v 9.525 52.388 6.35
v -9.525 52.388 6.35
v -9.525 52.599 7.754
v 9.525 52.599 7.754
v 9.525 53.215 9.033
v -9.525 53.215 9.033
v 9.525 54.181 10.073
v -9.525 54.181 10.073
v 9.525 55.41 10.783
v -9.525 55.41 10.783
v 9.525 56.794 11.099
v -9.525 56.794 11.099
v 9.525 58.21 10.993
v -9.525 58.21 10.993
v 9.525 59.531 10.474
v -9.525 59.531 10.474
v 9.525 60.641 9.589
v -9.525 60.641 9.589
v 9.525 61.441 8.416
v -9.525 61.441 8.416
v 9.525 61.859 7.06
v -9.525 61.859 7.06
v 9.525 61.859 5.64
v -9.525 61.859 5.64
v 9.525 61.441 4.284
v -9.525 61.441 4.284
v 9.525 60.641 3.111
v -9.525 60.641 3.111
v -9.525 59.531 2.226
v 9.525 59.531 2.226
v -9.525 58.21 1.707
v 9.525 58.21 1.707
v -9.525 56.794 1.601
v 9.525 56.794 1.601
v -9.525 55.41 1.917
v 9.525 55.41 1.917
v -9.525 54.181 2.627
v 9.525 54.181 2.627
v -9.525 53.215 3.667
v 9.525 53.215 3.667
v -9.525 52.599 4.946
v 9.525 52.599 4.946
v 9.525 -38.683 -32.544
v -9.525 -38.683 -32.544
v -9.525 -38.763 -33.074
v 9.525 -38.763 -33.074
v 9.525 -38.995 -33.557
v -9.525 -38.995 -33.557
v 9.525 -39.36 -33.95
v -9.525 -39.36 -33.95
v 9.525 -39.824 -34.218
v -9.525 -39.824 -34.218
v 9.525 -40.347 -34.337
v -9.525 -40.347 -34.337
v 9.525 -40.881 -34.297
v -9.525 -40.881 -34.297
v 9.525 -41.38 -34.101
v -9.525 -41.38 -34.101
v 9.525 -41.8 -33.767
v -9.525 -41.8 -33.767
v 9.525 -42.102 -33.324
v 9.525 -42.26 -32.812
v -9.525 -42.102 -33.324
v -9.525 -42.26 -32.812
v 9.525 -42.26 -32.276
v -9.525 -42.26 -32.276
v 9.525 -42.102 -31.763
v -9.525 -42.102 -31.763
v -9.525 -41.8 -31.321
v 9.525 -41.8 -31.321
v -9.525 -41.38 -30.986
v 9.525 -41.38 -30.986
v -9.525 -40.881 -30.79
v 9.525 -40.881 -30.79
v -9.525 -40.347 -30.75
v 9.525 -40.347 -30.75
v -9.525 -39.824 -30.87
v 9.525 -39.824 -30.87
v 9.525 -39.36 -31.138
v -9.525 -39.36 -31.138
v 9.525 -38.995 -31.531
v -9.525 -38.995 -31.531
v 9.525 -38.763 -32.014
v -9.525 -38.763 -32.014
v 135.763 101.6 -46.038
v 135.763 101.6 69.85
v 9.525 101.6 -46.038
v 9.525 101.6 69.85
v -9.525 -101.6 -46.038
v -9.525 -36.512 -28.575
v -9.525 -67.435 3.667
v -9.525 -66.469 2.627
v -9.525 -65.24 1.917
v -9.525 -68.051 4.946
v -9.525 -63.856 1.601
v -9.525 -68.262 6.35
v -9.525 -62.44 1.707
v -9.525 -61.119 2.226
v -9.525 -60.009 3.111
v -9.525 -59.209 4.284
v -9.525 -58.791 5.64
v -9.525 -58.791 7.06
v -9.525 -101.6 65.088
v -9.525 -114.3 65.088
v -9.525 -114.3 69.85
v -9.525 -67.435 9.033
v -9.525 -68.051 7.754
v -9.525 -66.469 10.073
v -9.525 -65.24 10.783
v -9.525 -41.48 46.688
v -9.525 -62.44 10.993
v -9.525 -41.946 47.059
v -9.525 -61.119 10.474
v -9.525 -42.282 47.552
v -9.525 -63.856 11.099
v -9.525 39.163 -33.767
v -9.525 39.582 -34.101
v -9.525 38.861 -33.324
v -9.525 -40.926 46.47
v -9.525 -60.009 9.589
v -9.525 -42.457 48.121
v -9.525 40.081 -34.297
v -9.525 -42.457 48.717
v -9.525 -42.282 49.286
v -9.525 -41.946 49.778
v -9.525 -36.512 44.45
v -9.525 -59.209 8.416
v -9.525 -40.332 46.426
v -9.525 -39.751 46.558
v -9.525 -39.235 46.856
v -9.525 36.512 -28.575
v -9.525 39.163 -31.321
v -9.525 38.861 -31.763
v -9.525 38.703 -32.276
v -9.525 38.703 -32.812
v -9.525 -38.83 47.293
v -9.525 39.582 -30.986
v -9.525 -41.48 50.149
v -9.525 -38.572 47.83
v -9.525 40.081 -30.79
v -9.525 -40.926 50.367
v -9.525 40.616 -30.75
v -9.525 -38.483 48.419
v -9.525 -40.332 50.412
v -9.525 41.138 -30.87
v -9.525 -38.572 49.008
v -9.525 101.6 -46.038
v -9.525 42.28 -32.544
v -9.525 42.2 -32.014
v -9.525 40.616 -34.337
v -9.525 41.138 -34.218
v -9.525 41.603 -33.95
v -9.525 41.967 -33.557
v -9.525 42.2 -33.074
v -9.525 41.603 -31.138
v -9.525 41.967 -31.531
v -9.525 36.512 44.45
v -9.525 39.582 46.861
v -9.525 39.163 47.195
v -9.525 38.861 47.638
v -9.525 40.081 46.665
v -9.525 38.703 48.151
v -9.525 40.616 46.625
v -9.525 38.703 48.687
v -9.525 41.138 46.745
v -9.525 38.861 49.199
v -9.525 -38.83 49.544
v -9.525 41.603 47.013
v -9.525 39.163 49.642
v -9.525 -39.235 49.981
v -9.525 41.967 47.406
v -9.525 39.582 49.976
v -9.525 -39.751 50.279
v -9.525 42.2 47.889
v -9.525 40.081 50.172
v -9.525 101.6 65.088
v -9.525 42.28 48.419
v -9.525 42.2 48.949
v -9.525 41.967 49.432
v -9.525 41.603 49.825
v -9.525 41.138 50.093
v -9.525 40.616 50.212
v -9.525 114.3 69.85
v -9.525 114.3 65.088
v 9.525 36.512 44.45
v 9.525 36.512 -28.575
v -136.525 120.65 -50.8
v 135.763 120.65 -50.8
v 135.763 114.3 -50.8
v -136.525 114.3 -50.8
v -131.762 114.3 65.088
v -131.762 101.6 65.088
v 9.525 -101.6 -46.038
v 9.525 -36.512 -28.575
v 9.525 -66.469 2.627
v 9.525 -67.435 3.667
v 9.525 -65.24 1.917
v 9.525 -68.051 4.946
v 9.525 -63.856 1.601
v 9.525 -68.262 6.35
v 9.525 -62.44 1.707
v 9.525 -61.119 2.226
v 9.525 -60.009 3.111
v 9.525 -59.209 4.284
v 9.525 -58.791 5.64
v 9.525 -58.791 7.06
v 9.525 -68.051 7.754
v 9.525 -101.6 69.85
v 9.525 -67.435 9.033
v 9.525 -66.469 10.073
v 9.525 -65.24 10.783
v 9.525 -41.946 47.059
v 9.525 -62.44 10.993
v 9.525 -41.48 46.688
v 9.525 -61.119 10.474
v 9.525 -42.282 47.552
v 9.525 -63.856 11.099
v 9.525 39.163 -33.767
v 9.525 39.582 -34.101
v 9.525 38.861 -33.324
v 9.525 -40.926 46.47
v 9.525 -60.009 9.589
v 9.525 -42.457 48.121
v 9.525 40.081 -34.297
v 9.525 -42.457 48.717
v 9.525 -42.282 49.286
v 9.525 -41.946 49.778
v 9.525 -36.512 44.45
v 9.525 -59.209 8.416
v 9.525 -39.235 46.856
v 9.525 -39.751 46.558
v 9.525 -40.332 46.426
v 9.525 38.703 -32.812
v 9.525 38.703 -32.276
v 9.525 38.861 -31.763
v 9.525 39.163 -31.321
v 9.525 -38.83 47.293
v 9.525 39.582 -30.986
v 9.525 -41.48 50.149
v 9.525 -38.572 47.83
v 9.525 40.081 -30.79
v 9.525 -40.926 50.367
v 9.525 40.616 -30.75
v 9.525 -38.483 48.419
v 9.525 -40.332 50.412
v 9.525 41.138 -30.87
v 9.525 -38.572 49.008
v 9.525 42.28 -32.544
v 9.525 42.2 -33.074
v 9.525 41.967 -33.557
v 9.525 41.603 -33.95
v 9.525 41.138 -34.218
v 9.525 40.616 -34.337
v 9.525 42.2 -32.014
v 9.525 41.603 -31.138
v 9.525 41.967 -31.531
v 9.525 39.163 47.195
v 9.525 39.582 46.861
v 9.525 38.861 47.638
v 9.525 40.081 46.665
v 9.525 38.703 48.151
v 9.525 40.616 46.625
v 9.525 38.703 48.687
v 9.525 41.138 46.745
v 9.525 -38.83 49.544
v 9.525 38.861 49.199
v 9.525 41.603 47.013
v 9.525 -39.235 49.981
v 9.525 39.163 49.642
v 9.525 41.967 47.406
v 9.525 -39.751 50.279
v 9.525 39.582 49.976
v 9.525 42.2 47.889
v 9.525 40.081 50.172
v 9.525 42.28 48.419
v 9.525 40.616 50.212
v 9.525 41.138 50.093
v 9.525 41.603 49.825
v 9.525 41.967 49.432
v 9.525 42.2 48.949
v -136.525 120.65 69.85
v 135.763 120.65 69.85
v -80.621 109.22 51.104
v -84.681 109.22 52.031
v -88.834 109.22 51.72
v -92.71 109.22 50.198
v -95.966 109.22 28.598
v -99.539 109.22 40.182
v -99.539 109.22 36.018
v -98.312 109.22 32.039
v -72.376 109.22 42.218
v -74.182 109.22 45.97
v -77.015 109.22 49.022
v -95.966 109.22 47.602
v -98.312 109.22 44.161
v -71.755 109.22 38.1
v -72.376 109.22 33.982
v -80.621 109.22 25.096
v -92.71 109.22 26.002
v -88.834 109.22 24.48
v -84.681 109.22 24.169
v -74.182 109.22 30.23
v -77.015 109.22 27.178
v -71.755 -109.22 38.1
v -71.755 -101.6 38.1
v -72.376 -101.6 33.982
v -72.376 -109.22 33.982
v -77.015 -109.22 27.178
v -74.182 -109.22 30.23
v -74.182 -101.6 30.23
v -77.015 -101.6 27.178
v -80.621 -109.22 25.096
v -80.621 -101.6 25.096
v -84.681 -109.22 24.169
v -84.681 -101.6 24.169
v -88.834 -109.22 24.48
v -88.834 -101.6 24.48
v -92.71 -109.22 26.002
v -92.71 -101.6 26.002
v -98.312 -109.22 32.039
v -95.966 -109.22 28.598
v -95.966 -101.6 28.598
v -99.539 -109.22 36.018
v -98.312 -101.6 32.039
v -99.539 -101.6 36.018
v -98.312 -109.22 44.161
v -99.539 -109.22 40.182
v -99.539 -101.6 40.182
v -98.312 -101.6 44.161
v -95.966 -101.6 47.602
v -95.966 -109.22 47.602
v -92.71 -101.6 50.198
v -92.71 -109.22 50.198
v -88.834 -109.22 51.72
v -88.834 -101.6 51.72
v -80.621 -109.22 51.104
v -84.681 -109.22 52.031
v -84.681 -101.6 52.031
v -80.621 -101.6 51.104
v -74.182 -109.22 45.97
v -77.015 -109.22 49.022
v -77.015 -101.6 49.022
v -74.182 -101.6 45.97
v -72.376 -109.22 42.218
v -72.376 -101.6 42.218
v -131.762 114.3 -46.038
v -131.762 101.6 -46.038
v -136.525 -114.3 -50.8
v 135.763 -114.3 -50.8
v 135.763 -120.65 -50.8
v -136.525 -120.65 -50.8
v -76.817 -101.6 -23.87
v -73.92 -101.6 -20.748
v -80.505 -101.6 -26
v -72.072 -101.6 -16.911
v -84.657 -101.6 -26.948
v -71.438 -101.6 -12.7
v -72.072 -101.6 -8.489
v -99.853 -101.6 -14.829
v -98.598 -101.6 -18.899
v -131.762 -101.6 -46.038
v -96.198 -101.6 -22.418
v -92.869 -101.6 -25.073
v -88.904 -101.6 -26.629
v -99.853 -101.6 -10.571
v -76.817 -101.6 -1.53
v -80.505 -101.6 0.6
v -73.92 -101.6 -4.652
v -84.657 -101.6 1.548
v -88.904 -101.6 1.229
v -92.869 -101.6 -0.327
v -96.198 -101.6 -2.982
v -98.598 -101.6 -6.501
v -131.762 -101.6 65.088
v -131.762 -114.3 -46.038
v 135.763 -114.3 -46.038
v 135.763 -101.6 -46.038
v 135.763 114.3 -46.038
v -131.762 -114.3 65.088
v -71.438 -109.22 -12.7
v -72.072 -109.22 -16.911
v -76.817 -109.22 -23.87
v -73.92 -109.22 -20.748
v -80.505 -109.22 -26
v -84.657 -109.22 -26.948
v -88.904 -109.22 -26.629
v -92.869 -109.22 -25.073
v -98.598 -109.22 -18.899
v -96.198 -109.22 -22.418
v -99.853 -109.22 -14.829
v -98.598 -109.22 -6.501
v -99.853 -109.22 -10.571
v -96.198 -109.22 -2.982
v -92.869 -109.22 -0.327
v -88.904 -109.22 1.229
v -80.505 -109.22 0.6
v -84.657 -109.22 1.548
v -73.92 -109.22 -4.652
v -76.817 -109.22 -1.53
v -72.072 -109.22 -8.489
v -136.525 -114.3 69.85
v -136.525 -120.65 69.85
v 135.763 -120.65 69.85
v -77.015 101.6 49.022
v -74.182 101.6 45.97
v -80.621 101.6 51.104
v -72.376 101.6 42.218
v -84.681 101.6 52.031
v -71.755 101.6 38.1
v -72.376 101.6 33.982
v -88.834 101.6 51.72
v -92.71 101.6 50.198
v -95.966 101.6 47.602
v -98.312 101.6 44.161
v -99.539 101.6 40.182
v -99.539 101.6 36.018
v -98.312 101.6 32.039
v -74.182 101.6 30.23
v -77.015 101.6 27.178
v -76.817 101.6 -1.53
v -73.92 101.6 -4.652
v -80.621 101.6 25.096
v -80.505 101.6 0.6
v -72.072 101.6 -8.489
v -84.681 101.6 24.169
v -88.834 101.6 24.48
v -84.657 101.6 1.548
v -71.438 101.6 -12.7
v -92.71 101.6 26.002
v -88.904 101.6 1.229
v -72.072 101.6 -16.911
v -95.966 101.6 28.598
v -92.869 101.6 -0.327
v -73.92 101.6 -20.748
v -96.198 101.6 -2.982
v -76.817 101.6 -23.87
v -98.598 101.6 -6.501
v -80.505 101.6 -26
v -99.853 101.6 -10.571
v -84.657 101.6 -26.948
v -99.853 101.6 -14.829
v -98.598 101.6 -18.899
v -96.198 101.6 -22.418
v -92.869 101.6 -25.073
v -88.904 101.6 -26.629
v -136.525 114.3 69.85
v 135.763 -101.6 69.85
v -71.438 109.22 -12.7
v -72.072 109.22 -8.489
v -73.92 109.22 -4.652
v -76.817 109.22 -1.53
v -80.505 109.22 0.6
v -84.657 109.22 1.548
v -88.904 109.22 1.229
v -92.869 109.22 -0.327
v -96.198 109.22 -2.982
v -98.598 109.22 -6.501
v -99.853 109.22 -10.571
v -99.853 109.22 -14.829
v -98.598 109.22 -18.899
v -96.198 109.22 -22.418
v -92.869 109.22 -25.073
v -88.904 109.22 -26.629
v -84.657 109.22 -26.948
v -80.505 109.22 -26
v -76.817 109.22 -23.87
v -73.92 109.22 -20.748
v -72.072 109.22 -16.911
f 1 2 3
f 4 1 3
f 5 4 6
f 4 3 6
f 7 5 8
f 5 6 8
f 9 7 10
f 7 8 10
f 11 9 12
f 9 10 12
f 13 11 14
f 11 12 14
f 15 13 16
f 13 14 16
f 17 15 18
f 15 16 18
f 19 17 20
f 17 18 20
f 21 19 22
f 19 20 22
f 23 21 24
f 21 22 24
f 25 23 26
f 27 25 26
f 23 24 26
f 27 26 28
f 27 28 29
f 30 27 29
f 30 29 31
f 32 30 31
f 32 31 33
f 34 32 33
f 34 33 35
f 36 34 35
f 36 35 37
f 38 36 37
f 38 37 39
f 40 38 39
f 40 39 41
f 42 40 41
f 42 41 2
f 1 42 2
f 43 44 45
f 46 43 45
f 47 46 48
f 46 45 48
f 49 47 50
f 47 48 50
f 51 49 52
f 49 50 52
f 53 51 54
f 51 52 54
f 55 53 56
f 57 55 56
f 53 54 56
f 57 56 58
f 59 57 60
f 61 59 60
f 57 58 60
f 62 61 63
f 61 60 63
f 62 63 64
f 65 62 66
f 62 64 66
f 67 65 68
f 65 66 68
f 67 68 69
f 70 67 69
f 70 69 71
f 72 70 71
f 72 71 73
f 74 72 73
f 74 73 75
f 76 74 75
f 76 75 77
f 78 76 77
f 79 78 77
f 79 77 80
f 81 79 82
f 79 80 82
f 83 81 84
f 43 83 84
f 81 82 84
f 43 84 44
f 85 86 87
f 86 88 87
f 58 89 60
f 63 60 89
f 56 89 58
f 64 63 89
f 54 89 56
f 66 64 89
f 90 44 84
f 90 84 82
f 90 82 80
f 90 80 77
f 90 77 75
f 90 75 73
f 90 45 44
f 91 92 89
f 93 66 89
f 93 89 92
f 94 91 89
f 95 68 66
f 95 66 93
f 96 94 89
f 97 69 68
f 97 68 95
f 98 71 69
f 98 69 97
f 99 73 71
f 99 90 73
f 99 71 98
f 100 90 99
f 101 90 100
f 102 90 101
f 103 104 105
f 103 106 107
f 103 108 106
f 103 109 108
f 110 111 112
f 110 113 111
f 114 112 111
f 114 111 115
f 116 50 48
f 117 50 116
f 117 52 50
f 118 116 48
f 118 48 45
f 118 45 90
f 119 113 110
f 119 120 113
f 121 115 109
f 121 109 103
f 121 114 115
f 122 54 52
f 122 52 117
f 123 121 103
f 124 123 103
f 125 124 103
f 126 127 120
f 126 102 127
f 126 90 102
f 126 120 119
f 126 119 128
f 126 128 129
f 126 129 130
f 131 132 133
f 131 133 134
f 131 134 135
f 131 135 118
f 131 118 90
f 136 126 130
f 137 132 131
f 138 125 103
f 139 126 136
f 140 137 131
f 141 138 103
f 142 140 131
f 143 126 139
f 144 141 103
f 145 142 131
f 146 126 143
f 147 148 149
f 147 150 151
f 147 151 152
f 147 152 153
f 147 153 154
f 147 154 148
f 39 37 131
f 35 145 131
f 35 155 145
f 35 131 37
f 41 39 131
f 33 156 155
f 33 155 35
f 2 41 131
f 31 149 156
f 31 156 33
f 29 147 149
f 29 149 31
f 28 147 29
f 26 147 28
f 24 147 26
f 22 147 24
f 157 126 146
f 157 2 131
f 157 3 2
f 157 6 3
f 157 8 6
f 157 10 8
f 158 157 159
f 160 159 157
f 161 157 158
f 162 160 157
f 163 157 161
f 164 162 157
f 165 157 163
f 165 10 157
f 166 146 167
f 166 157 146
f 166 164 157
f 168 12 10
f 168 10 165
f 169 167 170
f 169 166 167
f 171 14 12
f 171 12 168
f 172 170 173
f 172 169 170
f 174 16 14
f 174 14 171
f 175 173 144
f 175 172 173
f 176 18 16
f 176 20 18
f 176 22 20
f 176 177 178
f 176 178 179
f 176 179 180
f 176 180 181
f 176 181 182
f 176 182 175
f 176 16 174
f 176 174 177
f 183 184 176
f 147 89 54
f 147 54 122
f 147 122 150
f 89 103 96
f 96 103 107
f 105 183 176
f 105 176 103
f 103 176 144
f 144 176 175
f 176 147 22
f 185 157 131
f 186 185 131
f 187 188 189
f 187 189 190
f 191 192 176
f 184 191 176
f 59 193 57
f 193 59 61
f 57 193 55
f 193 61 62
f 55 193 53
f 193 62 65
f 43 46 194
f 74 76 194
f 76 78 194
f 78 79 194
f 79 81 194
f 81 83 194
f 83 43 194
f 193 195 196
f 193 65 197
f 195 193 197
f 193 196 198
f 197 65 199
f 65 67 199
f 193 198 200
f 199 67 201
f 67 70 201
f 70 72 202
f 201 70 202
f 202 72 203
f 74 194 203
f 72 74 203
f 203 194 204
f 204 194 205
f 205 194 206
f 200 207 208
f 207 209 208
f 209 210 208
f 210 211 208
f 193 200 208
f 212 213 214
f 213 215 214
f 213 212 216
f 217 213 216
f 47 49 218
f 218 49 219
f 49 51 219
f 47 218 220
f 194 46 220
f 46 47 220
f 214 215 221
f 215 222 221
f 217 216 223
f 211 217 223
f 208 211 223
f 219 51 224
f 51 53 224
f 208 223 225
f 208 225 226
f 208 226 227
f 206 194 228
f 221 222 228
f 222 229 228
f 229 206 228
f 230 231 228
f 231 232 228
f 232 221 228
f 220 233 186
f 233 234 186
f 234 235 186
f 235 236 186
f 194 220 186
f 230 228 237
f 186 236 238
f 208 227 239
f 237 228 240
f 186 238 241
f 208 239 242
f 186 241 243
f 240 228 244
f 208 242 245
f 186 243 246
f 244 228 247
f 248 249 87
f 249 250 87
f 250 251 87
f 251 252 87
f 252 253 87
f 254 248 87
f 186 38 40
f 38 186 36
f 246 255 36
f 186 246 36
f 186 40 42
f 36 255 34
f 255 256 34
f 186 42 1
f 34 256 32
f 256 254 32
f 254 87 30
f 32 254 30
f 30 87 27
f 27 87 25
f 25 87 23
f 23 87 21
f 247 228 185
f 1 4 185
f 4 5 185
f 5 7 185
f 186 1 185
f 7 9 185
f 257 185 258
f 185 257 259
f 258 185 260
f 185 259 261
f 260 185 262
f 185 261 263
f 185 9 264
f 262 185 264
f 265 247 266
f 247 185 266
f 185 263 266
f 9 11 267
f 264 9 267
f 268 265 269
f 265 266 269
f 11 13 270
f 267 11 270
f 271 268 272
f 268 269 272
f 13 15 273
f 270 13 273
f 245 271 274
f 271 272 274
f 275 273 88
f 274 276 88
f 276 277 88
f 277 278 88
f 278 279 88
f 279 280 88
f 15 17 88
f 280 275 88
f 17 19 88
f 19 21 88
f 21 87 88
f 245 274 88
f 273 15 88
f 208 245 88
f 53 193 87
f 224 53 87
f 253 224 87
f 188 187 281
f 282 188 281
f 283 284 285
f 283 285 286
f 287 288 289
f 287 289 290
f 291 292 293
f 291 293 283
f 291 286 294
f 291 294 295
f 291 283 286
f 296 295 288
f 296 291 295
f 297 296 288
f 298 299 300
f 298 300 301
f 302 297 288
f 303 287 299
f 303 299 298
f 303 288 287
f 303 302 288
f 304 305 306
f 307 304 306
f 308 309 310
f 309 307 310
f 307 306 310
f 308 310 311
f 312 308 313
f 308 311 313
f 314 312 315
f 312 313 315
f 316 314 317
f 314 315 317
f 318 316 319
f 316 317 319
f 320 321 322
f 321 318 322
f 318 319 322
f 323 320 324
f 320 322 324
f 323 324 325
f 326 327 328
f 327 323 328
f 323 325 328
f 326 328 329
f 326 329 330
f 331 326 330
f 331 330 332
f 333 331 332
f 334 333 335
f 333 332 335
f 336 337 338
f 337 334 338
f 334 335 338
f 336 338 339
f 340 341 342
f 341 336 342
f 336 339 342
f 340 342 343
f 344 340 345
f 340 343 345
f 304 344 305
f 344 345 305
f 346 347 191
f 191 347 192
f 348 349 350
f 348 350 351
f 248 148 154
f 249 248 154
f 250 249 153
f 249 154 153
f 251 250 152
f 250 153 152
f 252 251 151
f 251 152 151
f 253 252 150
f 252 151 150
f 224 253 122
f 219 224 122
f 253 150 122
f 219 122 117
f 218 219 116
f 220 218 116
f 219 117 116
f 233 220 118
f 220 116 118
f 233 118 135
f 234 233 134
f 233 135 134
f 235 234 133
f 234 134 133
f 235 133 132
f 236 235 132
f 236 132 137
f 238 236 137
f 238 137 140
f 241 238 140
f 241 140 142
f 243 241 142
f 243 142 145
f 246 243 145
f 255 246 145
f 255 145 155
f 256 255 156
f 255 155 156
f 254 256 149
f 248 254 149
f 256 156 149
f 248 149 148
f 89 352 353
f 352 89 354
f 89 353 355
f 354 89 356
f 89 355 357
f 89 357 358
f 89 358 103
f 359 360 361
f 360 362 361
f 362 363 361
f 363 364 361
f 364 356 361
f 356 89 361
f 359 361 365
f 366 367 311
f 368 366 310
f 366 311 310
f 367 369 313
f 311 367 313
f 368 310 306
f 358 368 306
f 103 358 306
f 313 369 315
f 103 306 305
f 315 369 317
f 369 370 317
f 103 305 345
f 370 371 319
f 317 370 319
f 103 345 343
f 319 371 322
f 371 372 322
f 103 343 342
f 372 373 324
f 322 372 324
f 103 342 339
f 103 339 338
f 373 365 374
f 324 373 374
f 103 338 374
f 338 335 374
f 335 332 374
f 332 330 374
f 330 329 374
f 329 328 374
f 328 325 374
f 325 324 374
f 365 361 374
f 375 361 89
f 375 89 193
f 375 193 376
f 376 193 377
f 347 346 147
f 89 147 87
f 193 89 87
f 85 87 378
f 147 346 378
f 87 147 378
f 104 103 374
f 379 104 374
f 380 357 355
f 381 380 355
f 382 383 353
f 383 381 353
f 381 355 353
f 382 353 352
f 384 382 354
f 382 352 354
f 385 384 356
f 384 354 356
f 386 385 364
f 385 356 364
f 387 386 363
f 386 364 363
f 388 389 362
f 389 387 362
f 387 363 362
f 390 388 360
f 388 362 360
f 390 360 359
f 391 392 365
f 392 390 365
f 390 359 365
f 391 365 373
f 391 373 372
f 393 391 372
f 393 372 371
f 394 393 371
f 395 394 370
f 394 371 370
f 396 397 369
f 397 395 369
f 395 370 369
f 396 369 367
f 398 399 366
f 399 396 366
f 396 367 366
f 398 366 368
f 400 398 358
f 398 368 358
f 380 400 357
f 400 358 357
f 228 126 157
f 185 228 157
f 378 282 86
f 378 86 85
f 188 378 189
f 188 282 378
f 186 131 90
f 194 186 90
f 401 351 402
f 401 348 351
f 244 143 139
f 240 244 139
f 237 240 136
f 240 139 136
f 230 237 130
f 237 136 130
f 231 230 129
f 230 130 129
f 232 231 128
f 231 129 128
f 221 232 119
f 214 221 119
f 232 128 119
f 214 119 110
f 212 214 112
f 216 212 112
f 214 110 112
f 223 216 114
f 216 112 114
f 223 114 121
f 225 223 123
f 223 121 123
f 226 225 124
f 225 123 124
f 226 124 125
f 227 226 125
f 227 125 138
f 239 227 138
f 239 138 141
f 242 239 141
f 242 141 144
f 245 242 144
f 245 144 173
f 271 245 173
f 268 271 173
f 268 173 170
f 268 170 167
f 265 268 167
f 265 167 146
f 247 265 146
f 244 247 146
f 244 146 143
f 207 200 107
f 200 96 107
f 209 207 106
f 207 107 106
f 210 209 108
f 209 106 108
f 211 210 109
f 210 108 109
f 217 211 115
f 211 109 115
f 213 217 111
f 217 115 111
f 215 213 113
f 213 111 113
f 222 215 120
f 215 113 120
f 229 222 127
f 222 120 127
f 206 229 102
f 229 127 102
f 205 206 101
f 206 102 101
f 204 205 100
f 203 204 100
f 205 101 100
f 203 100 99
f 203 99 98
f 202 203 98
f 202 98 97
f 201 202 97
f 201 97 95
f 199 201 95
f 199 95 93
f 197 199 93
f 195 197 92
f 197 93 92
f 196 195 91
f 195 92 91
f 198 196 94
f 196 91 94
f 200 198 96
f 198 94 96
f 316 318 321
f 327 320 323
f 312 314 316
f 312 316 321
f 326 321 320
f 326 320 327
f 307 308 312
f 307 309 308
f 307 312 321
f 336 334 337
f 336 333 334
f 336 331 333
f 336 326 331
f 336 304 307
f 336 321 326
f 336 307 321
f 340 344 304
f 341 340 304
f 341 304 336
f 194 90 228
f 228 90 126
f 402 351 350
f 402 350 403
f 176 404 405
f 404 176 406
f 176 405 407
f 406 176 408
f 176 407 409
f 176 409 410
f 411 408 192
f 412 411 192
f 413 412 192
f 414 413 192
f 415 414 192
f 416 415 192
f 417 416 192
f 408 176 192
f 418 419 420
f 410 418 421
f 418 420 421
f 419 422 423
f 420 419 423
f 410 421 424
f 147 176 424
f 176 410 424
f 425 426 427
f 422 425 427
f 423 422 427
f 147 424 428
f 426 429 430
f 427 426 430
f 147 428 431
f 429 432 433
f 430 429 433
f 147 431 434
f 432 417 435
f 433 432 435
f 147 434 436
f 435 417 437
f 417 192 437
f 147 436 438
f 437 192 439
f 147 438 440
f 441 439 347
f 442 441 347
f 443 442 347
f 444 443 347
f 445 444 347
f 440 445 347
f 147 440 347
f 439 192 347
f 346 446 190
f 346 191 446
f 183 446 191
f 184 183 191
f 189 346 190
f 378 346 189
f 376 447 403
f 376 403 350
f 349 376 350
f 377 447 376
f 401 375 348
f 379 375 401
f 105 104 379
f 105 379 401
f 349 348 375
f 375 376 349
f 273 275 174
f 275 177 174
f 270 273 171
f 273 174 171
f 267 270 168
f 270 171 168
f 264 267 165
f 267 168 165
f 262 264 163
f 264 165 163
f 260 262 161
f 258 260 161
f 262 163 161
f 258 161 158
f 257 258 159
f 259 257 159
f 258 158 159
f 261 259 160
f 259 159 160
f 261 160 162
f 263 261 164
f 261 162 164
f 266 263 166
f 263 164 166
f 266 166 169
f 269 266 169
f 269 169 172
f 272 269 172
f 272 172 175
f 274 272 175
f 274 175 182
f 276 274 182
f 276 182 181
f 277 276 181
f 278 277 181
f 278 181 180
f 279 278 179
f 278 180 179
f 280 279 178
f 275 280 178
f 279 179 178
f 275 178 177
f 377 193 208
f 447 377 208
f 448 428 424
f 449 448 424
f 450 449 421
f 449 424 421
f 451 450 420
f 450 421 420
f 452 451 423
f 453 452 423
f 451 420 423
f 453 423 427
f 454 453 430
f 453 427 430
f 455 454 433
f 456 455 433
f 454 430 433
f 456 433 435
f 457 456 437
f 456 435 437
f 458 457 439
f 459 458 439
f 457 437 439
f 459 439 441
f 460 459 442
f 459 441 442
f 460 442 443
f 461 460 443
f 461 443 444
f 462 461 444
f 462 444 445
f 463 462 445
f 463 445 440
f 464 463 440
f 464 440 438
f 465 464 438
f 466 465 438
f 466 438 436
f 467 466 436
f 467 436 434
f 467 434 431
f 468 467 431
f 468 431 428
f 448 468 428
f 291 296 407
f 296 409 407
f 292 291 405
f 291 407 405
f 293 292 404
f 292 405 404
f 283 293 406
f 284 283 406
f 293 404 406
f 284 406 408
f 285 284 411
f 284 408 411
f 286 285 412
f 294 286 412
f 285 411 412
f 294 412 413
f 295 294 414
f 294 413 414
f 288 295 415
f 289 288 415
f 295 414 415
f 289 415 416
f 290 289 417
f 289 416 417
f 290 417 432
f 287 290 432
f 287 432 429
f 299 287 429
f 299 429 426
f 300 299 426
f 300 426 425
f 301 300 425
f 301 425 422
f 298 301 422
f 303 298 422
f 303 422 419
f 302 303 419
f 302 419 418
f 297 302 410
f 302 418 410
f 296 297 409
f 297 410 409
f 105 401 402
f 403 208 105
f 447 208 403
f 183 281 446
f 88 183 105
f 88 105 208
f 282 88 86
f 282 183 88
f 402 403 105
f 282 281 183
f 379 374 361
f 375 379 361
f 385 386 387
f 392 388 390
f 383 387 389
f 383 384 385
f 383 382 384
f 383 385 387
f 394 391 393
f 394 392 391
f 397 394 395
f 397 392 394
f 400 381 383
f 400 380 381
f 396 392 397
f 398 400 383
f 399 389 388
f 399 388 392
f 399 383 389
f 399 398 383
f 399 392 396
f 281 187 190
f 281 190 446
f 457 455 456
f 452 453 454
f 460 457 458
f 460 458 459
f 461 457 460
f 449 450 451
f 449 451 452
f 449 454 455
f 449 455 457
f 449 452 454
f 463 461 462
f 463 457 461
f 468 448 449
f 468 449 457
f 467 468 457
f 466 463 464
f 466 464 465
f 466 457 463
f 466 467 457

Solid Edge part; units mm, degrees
sketch "Sketch1" plane through (0, 0, 0) normal (0, -1, 0) x (1, 0, 0)
  line L0 (-136.525, 69.85) -> (135.763, 69.85)
  line L1 (135.763, 69.85) -> (135.763, -50.8)
  line L2 (135.763, -50.8) -> (-136.525, -50.8)
  line L3 (-136.525, -50.8) -> (-136.525, 69.85)
  dimension "D1" = 50.8
  dimension "D2" = 120.65
  dimension "D3" = 120.65
extrude "Protrusion1" add sketch "Sketch1" along normal mid plane 241.3
sketch "Sketch2" plane through (0, 0, 0) normal (1, 0, 0) x (0, 1, 0)
  line L0 (101.6, -69.85) -> (-101.6, -69.85)
  line L1 (-101.6, -69.85) -> (-101.6, 69.85)
  line L2 (-101.6, 69.85) -> (101.6, 69.85)
  line L3 (101.6, 69.85) -> (101.6, -69.85)
  dimension "D1" = 19.05
  dimension "D2" = 19.05
extrude "Cutout1" cut sketch "Sketch2" along normal up to next and the other way up to next
sketch "Sketch3" plane through (6.4194, -101.6, 0) normal (0, 1, 0) x (-1, 0, 0)
  line L0 (138.1819, -46.0375) -> (15.9444, -46.0375)
  line L1 (15.9444, -50.8) -> (15.9444, -46.0375)
  line L2 (15.9444, -50.8) -> (142.9444, -50.8)
  line L3 (142.9444, -50.8) -> (142.9444, 69.85)
  line L4 (142.9444, 69.85) -> (15.9444, 69.85)
  line L5 (15.9444, 65.0875) -> (15.9444, 69.85)
  line L6 (15.9444, 65.0875) -> (138.1819, 65.0875)
  line L7 (138.1819, 65.0875) -> (138.1819, -46.0375)
  dimension "D1" = 4.7625
  dimension "D2" = 4.7625
  dimension "D3" = 4.7625
extrude "ExtrudedCutout_2" cut sketch "Sketch3" against normal blind 12.7
mirror "Mirror1" about plane through (0, 0, 0) normal (0, 1, 0) of "ExtrudedCutout_2"
sketch "Sketch4" plane through (21.4313, 101.6, 12.7) normal (0, -1, 0) x (1, 0, 0)
  circle A0 centre (-107.1563, -25.4) radius 14.2875
  circle A1 centre (-107.1563, 25.4) radius 13.97
  dimension "D1" = 28.575
extrude "ExtrudedCutout_3" cut sketch "Sketch4" against normal blind 7.62
mirror "Mirror2" about plane through (0, 0, 0) normal (0, -1, 0) of "ExtrudedCutout_3"
sketch "Sketch5" plane through (6.4194, 0, 0) normal (0, -1, 0) x (1, 0, 0)
  line L0 (-15.9444, -46.0375) -> (3.1056, -46.0375)
  line L1 (3.1056, -46.0375) -> (3.1056, 69.85)
  line L2 (3.1056, 69.85) -> (-15.9444, 69.85)
  line L3 (-15.9444, 69.85) -> (-15.9444, -46.0375)
  dimension "D1" = 19.05
  dimension "D2" = 4.7625
extrude "Protrusion2" add sketch "Sketch5" along normal up to next and the other way up to next
sketch "Sketch6" plane through (0, 0, 0) normal (1, 0, 0) x (0, 1, 0)
  line L0 (36.5125, -28.575) -> (-36.5125, -28.575)
  line L1 (-36.5125, -28.575) -> (-36.5125, 44.45)
  line L2 (-36.5125, 44.45) -> (36.5125, 44.45)
  line L3 (36.5125, 44.45) -> (36.5125, -28.575)
  circle A0 centre (-40.4813, 48.4187) radius 1.9984
  circle A1 centre (-40.4812, -32.5438) radius 1.7985
  circle A2 centre (40.4813, 48.4187) radius 1.7985
  circle A3 centre (40.4813, -32.5438) radius 1.7985
  dimension "D1" = 73.025
  dimension "D2" = 73.025
  dimension "D3" = 22.225
  dimension "D4" = 80.9625
  dimension "D5" = 80.9625
  dimension "D6" = 92.075
  dimension "D7" = 92.075
extrude "Cutout2" cut sketch "Sketch6" along normal up to next and the other way up to next
sketch "Sketch7" plane through (-9.525, 0, 3.175) normal (-1, 0, 0) x (0, -1, 0)
  circle A0 centre (-57.15, 3.175) radius 4.7625
  circle A1 centre (63.5, 3.175) radius 4.7625
  dimension "D1" = 6.35
  dimension "D2" = 57.15
  dimension "D3" = 63.5
  dimension "D4" = 9.525
extrude "Cutout3" cut sketch "Sketch7" against normal up to next
sketch "Sketch8" plane through (-136.525, 117.475, 0) normal (-1, 0, 0) x (0, 0, 1)
  line L0 (-46.0375, -3.175) -> (-50.8, -3.175)
  line L1 (-50.8, -3.175) -> (-50.8, -15.875)
  line L2 (-50.8, -15.875) -> (-46.0375, -15.875)
  line L3 (-46.0375, -15.875) -> (-46.0375, -3.175)
  dimension "D1" = 4.7625
  dimension "D2" = 19.05
extrude "Cutout4" cut sketch "Sketch8" against normal up to next
mirror "Mirror3" about plane through (0, 0, 0) normal (0, -1, 0) of "Cutout4"
